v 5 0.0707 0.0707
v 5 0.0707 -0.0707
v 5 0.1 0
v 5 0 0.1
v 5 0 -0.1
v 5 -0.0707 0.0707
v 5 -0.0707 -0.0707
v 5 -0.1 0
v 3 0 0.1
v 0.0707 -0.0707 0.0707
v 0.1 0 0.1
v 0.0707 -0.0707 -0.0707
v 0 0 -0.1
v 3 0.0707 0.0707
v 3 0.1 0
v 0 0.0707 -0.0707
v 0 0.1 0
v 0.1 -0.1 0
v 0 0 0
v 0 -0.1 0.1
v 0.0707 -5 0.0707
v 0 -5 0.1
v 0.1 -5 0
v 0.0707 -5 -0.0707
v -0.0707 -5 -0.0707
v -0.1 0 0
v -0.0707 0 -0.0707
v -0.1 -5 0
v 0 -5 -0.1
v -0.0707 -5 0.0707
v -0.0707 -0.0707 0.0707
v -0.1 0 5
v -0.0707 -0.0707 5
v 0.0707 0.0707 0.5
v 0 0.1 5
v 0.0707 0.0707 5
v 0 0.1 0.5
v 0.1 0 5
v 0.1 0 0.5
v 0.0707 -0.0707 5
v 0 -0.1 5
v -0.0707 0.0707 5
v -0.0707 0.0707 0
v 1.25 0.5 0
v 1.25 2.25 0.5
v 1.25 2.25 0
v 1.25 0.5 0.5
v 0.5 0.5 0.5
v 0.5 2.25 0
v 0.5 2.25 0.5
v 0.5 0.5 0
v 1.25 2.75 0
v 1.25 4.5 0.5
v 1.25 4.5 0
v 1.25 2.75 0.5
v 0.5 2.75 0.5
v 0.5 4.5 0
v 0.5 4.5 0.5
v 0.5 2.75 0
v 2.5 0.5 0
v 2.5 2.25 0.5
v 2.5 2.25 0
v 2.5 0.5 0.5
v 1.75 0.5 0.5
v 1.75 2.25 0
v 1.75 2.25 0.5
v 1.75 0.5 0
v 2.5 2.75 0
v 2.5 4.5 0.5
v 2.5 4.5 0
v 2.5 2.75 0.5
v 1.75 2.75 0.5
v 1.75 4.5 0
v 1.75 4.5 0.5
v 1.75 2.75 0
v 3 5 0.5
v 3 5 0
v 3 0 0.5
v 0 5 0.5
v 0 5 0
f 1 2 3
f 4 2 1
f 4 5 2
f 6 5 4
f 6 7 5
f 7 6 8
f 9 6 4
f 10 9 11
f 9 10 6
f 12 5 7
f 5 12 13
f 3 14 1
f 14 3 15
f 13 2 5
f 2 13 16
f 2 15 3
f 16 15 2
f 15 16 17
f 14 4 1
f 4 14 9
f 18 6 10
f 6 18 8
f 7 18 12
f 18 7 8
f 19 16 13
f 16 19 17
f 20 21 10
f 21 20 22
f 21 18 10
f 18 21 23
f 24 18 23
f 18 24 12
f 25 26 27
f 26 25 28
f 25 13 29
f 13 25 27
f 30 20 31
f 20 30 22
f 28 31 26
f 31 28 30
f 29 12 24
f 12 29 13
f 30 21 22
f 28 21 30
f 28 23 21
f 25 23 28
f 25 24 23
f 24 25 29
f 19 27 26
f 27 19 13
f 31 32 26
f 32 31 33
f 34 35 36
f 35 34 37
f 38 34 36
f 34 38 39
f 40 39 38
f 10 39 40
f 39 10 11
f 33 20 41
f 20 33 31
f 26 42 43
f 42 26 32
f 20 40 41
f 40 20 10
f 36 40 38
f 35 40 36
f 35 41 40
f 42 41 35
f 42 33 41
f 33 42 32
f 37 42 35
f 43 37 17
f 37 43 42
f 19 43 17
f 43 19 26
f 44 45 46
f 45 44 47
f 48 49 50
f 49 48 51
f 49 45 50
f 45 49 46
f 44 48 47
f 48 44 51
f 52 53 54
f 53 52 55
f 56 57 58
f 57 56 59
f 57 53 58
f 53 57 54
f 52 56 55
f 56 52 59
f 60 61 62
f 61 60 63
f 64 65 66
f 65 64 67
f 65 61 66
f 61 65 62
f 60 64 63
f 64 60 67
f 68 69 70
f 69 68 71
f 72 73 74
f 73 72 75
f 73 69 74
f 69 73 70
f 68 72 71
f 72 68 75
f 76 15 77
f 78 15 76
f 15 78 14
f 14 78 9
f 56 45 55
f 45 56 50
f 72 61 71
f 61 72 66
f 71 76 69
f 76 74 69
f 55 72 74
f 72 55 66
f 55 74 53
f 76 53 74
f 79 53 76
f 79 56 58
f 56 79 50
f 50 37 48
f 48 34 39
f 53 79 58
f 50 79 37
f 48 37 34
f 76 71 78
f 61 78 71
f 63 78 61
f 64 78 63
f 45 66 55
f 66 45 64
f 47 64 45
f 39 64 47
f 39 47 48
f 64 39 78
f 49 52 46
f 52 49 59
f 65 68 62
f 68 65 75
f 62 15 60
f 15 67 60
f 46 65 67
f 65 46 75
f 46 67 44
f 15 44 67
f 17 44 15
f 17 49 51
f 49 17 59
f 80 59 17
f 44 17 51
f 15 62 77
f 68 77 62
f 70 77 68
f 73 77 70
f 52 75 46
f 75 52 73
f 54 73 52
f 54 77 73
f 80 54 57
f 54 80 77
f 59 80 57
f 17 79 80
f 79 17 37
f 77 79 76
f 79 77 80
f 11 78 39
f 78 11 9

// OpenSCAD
/**
* Mandala Generator
*
* Sourcecode: git@github-veryos:veryos-git/openscad_stargen_v3.git
* Author: veryos  
* Version: 1.0
*
* Description:
* This OpenSCAD script generates a 3d object is a tiny house
*
* License:
*    Licensed under the GNU General Public License v3.0 or later.
*    See the LICENSE.txt file in the repository root for details.
*
* Opensource credits:
* - openscad 'language': https://openscad.org/ 
* - online openscad playground: https://ochafik.com/openscad2
* - free image editor : https://rawtherapee.com/
* - free source code hosting: https://github.com/
* - online photo collage: https://pixlr.com/photo-collage/
* - thumbnail designer: https://tools.datmt.com/tools/thumb-maker
* 
* https://ochafik.com/openscad2
*
* Changelog:
* [v1.0] Initial release
*/


// proxying the parameters
housewidth = 20;
housedepth = 30; 
househeight = 25;
roofheight = 10;
thicknesswall = 2;

a = housewidth; 
l = housedepth;
b = househeight;

c = roofheight; 
tw = thicknesswall;


// Axis helper for orientation
module axis_helper(size = 5) {
    // X axis - Red
    color("red") 
        translate([0, 0, 0]) 
        rotate([0, 90, 0]) 
        cylinder(h = size, r = 0.1, $fn = 8);
    
    // Y axis - Green
    color("green") 
        translate([0, 0, 0]) 
        rotate([90, 0, 0]) 
        cylinder(h = size, r = 0.1, $fn = 8);
    
    // Z axis - Blue
    color("blue") 
        translate([0, 0, 0]) 
        cylinder(h = size, r = 0.1, $fn = 8);
}

axis_helper(5);


module window(
    w, 
    h,
    t, 
    t2 // fenstersprossen / window mountins / window gridbars  
){
    let(
        rows = 2, 
        cols = 2, 
        pane_width = (w - (t2*(cols+1)))/cols,
        pane_height = (h - (t2*(rows+1)))/rows
    ){
        difference(){
            // window frame
            cube([w, h, t]);

            // cut out the glass panes
            for(i = [0 : cols - 1]){
                for(j = [0 : rows - 1]){
                    translate([t2 + i*(t2+pane_width), t2 + j*(t2+pane_height), -t])
                        cube([pane_width, pane_height, t*3]);
                }
            }
            
        }
    }
}
window(3, 5, .5, 0.5);
